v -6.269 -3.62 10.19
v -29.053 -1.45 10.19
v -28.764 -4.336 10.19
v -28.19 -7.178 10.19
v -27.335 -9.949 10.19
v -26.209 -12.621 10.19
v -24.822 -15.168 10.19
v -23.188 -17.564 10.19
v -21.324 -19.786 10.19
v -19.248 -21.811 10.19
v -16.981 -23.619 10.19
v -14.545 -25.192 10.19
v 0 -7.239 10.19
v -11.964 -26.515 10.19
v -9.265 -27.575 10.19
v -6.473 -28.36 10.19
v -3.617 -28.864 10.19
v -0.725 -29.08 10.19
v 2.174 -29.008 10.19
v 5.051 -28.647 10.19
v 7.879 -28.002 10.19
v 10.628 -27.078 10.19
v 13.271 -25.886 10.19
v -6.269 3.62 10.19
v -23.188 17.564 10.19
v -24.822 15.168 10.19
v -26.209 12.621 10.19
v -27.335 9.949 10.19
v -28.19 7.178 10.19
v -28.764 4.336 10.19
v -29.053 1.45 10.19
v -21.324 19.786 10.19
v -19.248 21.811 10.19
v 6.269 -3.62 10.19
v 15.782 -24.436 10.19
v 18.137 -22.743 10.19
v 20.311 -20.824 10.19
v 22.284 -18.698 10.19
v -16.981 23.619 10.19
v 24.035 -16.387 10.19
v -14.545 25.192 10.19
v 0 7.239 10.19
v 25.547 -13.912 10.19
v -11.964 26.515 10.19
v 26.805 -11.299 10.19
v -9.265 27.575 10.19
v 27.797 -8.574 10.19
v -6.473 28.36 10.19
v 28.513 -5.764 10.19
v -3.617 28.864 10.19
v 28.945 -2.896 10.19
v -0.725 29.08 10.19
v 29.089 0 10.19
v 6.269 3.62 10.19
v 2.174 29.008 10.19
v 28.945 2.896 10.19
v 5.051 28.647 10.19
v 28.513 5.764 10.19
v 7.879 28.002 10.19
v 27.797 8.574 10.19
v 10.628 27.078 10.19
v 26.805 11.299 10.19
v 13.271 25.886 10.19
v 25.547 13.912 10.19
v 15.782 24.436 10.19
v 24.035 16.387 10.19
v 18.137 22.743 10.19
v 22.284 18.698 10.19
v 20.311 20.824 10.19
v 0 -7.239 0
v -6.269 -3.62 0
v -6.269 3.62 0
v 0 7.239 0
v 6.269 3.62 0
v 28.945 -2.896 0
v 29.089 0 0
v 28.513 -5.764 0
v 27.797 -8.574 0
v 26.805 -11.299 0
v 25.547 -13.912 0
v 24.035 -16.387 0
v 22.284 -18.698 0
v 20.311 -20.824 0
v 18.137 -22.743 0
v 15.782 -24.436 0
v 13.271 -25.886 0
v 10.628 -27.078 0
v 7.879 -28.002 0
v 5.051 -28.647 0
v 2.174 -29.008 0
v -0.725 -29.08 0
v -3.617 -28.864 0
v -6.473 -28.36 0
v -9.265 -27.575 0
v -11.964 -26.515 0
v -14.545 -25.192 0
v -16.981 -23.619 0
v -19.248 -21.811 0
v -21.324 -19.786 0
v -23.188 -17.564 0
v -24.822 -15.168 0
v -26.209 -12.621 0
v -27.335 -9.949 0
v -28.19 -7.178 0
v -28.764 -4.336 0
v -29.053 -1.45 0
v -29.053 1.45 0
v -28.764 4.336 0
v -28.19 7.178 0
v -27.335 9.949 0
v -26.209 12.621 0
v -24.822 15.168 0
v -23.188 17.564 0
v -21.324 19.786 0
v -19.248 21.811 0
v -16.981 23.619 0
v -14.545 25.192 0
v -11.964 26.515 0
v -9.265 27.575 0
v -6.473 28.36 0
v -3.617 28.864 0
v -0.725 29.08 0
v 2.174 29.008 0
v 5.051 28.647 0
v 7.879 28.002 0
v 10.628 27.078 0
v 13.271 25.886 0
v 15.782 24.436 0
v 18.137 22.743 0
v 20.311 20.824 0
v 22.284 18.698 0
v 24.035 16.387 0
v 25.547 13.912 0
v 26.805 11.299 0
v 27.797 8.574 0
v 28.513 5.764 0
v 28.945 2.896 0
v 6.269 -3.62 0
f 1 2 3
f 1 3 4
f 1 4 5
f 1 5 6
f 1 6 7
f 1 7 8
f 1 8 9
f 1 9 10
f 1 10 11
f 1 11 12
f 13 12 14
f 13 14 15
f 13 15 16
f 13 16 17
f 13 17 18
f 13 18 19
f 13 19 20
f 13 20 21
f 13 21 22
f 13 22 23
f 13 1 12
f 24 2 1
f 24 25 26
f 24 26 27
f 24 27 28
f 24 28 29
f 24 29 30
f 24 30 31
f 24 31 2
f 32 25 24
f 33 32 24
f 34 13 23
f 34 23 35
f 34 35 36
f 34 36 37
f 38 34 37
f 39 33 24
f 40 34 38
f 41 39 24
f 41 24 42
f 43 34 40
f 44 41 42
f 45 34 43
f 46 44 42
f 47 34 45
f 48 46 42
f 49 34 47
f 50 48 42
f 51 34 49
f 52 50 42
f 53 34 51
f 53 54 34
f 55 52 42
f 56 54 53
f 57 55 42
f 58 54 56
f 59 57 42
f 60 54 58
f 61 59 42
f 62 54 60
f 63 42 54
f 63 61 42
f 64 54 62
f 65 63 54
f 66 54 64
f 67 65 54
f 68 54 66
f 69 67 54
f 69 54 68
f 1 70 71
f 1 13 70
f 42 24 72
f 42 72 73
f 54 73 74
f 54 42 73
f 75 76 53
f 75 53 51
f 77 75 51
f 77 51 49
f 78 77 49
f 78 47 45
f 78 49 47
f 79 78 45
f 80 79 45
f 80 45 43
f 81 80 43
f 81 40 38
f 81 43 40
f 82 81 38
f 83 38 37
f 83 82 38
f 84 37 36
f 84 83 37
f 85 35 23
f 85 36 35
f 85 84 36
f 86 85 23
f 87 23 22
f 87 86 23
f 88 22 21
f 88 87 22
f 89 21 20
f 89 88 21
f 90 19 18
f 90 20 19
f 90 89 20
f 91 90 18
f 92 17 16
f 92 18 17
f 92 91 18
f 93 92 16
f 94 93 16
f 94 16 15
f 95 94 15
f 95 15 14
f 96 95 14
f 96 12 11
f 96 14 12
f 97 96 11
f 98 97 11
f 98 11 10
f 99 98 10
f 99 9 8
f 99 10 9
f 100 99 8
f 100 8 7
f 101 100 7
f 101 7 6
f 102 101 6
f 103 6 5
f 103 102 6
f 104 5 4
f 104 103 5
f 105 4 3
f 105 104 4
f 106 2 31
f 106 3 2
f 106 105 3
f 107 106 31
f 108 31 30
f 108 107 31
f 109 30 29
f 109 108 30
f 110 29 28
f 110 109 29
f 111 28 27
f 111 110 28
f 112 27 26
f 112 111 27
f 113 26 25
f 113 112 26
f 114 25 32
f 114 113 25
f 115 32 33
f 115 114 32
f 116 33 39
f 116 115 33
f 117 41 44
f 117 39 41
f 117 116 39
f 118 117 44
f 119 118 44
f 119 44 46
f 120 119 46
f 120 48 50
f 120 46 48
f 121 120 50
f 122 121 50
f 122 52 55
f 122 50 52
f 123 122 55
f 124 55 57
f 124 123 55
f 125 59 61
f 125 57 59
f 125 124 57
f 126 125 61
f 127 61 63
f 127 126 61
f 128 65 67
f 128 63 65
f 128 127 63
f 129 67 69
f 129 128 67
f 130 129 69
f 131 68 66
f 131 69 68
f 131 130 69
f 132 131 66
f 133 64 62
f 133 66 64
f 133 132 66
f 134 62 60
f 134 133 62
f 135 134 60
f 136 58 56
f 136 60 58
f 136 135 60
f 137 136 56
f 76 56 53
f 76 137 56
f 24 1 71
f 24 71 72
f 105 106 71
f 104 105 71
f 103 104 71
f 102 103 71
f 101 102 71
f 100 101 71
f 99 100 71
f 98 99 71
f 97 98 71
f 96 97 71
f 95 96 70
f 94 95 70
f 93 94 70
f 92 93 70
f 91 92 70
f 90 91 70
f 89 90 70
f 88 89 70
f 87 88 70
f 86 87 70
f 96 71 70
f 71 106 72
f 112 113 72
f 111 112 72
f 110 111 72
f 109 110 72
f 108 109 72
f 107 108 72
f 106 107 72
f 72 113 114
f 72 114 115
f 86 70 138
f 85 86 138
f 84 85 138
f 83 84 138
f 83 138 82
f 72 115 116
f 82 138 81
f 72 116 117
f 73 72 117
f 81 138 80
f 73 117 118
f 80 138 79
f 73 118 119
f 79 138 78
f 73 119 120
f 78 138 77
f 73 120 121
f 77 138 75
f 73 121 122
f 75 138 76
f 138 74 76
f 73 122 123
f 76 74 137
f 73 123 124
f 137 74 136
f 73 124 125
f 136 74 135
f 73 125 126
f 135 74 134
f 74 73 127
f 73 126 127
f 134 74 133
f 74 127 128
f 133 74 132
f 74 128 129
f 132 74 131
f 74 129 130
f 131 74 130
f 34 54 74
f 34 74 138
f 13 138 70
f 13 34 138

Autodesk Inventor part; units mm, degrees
ref_plane "YZ Plane" through (0, 0, 0) normal (1, 0, 0) x (0, 1, 0)
ref_plane "XZ Plane" through (0, 0, 0) normal (0, 1, 0) x (-1, 0, 0)
ref_plane "XY Plane" through (0, 0, 0) normal (0, 0, 1) x (1, 0, 0)
sketch "Sketch1" plane through (0, 0, 0) normal (0, 0, 1) x (1, 0, 0)
  circle A0 centre (0, 0) radius 29.0893
  dimension "d0" = 58.1787
extrude "Extrusion1" add sketch "Sketch1" along normal blind 10.1905
sketch "Sketch2" plane through (0, 0, 10.1905) normal (0, 0, 1) x (1, 0, 0)
  line L0 (0, 7.239) -> (6.2692, 3.6195)
  line L1 (6.2692, 3.6195) -> (6.2692, -3.6195)
  line L2 (6.2692, -3.6195) -> (0, -7.239)
  line L3 (0, -7.239) -> (-6.2692, -3.6195)
  line L4 (-6.2692, -3.6195) -> (-6.2692, 3.6195)
  line L5 (-6.2692, 3.6195) -> (0, 7.239)
  point P0 (0, 0)
  point P1 (0, 0)
  point P2 (0, 0)
  dimension "d5" = 14.478
extrude "Extrusion2" cut sketch "Sketch2" against normal blind 10.1905
properties part number "large gear hex"
